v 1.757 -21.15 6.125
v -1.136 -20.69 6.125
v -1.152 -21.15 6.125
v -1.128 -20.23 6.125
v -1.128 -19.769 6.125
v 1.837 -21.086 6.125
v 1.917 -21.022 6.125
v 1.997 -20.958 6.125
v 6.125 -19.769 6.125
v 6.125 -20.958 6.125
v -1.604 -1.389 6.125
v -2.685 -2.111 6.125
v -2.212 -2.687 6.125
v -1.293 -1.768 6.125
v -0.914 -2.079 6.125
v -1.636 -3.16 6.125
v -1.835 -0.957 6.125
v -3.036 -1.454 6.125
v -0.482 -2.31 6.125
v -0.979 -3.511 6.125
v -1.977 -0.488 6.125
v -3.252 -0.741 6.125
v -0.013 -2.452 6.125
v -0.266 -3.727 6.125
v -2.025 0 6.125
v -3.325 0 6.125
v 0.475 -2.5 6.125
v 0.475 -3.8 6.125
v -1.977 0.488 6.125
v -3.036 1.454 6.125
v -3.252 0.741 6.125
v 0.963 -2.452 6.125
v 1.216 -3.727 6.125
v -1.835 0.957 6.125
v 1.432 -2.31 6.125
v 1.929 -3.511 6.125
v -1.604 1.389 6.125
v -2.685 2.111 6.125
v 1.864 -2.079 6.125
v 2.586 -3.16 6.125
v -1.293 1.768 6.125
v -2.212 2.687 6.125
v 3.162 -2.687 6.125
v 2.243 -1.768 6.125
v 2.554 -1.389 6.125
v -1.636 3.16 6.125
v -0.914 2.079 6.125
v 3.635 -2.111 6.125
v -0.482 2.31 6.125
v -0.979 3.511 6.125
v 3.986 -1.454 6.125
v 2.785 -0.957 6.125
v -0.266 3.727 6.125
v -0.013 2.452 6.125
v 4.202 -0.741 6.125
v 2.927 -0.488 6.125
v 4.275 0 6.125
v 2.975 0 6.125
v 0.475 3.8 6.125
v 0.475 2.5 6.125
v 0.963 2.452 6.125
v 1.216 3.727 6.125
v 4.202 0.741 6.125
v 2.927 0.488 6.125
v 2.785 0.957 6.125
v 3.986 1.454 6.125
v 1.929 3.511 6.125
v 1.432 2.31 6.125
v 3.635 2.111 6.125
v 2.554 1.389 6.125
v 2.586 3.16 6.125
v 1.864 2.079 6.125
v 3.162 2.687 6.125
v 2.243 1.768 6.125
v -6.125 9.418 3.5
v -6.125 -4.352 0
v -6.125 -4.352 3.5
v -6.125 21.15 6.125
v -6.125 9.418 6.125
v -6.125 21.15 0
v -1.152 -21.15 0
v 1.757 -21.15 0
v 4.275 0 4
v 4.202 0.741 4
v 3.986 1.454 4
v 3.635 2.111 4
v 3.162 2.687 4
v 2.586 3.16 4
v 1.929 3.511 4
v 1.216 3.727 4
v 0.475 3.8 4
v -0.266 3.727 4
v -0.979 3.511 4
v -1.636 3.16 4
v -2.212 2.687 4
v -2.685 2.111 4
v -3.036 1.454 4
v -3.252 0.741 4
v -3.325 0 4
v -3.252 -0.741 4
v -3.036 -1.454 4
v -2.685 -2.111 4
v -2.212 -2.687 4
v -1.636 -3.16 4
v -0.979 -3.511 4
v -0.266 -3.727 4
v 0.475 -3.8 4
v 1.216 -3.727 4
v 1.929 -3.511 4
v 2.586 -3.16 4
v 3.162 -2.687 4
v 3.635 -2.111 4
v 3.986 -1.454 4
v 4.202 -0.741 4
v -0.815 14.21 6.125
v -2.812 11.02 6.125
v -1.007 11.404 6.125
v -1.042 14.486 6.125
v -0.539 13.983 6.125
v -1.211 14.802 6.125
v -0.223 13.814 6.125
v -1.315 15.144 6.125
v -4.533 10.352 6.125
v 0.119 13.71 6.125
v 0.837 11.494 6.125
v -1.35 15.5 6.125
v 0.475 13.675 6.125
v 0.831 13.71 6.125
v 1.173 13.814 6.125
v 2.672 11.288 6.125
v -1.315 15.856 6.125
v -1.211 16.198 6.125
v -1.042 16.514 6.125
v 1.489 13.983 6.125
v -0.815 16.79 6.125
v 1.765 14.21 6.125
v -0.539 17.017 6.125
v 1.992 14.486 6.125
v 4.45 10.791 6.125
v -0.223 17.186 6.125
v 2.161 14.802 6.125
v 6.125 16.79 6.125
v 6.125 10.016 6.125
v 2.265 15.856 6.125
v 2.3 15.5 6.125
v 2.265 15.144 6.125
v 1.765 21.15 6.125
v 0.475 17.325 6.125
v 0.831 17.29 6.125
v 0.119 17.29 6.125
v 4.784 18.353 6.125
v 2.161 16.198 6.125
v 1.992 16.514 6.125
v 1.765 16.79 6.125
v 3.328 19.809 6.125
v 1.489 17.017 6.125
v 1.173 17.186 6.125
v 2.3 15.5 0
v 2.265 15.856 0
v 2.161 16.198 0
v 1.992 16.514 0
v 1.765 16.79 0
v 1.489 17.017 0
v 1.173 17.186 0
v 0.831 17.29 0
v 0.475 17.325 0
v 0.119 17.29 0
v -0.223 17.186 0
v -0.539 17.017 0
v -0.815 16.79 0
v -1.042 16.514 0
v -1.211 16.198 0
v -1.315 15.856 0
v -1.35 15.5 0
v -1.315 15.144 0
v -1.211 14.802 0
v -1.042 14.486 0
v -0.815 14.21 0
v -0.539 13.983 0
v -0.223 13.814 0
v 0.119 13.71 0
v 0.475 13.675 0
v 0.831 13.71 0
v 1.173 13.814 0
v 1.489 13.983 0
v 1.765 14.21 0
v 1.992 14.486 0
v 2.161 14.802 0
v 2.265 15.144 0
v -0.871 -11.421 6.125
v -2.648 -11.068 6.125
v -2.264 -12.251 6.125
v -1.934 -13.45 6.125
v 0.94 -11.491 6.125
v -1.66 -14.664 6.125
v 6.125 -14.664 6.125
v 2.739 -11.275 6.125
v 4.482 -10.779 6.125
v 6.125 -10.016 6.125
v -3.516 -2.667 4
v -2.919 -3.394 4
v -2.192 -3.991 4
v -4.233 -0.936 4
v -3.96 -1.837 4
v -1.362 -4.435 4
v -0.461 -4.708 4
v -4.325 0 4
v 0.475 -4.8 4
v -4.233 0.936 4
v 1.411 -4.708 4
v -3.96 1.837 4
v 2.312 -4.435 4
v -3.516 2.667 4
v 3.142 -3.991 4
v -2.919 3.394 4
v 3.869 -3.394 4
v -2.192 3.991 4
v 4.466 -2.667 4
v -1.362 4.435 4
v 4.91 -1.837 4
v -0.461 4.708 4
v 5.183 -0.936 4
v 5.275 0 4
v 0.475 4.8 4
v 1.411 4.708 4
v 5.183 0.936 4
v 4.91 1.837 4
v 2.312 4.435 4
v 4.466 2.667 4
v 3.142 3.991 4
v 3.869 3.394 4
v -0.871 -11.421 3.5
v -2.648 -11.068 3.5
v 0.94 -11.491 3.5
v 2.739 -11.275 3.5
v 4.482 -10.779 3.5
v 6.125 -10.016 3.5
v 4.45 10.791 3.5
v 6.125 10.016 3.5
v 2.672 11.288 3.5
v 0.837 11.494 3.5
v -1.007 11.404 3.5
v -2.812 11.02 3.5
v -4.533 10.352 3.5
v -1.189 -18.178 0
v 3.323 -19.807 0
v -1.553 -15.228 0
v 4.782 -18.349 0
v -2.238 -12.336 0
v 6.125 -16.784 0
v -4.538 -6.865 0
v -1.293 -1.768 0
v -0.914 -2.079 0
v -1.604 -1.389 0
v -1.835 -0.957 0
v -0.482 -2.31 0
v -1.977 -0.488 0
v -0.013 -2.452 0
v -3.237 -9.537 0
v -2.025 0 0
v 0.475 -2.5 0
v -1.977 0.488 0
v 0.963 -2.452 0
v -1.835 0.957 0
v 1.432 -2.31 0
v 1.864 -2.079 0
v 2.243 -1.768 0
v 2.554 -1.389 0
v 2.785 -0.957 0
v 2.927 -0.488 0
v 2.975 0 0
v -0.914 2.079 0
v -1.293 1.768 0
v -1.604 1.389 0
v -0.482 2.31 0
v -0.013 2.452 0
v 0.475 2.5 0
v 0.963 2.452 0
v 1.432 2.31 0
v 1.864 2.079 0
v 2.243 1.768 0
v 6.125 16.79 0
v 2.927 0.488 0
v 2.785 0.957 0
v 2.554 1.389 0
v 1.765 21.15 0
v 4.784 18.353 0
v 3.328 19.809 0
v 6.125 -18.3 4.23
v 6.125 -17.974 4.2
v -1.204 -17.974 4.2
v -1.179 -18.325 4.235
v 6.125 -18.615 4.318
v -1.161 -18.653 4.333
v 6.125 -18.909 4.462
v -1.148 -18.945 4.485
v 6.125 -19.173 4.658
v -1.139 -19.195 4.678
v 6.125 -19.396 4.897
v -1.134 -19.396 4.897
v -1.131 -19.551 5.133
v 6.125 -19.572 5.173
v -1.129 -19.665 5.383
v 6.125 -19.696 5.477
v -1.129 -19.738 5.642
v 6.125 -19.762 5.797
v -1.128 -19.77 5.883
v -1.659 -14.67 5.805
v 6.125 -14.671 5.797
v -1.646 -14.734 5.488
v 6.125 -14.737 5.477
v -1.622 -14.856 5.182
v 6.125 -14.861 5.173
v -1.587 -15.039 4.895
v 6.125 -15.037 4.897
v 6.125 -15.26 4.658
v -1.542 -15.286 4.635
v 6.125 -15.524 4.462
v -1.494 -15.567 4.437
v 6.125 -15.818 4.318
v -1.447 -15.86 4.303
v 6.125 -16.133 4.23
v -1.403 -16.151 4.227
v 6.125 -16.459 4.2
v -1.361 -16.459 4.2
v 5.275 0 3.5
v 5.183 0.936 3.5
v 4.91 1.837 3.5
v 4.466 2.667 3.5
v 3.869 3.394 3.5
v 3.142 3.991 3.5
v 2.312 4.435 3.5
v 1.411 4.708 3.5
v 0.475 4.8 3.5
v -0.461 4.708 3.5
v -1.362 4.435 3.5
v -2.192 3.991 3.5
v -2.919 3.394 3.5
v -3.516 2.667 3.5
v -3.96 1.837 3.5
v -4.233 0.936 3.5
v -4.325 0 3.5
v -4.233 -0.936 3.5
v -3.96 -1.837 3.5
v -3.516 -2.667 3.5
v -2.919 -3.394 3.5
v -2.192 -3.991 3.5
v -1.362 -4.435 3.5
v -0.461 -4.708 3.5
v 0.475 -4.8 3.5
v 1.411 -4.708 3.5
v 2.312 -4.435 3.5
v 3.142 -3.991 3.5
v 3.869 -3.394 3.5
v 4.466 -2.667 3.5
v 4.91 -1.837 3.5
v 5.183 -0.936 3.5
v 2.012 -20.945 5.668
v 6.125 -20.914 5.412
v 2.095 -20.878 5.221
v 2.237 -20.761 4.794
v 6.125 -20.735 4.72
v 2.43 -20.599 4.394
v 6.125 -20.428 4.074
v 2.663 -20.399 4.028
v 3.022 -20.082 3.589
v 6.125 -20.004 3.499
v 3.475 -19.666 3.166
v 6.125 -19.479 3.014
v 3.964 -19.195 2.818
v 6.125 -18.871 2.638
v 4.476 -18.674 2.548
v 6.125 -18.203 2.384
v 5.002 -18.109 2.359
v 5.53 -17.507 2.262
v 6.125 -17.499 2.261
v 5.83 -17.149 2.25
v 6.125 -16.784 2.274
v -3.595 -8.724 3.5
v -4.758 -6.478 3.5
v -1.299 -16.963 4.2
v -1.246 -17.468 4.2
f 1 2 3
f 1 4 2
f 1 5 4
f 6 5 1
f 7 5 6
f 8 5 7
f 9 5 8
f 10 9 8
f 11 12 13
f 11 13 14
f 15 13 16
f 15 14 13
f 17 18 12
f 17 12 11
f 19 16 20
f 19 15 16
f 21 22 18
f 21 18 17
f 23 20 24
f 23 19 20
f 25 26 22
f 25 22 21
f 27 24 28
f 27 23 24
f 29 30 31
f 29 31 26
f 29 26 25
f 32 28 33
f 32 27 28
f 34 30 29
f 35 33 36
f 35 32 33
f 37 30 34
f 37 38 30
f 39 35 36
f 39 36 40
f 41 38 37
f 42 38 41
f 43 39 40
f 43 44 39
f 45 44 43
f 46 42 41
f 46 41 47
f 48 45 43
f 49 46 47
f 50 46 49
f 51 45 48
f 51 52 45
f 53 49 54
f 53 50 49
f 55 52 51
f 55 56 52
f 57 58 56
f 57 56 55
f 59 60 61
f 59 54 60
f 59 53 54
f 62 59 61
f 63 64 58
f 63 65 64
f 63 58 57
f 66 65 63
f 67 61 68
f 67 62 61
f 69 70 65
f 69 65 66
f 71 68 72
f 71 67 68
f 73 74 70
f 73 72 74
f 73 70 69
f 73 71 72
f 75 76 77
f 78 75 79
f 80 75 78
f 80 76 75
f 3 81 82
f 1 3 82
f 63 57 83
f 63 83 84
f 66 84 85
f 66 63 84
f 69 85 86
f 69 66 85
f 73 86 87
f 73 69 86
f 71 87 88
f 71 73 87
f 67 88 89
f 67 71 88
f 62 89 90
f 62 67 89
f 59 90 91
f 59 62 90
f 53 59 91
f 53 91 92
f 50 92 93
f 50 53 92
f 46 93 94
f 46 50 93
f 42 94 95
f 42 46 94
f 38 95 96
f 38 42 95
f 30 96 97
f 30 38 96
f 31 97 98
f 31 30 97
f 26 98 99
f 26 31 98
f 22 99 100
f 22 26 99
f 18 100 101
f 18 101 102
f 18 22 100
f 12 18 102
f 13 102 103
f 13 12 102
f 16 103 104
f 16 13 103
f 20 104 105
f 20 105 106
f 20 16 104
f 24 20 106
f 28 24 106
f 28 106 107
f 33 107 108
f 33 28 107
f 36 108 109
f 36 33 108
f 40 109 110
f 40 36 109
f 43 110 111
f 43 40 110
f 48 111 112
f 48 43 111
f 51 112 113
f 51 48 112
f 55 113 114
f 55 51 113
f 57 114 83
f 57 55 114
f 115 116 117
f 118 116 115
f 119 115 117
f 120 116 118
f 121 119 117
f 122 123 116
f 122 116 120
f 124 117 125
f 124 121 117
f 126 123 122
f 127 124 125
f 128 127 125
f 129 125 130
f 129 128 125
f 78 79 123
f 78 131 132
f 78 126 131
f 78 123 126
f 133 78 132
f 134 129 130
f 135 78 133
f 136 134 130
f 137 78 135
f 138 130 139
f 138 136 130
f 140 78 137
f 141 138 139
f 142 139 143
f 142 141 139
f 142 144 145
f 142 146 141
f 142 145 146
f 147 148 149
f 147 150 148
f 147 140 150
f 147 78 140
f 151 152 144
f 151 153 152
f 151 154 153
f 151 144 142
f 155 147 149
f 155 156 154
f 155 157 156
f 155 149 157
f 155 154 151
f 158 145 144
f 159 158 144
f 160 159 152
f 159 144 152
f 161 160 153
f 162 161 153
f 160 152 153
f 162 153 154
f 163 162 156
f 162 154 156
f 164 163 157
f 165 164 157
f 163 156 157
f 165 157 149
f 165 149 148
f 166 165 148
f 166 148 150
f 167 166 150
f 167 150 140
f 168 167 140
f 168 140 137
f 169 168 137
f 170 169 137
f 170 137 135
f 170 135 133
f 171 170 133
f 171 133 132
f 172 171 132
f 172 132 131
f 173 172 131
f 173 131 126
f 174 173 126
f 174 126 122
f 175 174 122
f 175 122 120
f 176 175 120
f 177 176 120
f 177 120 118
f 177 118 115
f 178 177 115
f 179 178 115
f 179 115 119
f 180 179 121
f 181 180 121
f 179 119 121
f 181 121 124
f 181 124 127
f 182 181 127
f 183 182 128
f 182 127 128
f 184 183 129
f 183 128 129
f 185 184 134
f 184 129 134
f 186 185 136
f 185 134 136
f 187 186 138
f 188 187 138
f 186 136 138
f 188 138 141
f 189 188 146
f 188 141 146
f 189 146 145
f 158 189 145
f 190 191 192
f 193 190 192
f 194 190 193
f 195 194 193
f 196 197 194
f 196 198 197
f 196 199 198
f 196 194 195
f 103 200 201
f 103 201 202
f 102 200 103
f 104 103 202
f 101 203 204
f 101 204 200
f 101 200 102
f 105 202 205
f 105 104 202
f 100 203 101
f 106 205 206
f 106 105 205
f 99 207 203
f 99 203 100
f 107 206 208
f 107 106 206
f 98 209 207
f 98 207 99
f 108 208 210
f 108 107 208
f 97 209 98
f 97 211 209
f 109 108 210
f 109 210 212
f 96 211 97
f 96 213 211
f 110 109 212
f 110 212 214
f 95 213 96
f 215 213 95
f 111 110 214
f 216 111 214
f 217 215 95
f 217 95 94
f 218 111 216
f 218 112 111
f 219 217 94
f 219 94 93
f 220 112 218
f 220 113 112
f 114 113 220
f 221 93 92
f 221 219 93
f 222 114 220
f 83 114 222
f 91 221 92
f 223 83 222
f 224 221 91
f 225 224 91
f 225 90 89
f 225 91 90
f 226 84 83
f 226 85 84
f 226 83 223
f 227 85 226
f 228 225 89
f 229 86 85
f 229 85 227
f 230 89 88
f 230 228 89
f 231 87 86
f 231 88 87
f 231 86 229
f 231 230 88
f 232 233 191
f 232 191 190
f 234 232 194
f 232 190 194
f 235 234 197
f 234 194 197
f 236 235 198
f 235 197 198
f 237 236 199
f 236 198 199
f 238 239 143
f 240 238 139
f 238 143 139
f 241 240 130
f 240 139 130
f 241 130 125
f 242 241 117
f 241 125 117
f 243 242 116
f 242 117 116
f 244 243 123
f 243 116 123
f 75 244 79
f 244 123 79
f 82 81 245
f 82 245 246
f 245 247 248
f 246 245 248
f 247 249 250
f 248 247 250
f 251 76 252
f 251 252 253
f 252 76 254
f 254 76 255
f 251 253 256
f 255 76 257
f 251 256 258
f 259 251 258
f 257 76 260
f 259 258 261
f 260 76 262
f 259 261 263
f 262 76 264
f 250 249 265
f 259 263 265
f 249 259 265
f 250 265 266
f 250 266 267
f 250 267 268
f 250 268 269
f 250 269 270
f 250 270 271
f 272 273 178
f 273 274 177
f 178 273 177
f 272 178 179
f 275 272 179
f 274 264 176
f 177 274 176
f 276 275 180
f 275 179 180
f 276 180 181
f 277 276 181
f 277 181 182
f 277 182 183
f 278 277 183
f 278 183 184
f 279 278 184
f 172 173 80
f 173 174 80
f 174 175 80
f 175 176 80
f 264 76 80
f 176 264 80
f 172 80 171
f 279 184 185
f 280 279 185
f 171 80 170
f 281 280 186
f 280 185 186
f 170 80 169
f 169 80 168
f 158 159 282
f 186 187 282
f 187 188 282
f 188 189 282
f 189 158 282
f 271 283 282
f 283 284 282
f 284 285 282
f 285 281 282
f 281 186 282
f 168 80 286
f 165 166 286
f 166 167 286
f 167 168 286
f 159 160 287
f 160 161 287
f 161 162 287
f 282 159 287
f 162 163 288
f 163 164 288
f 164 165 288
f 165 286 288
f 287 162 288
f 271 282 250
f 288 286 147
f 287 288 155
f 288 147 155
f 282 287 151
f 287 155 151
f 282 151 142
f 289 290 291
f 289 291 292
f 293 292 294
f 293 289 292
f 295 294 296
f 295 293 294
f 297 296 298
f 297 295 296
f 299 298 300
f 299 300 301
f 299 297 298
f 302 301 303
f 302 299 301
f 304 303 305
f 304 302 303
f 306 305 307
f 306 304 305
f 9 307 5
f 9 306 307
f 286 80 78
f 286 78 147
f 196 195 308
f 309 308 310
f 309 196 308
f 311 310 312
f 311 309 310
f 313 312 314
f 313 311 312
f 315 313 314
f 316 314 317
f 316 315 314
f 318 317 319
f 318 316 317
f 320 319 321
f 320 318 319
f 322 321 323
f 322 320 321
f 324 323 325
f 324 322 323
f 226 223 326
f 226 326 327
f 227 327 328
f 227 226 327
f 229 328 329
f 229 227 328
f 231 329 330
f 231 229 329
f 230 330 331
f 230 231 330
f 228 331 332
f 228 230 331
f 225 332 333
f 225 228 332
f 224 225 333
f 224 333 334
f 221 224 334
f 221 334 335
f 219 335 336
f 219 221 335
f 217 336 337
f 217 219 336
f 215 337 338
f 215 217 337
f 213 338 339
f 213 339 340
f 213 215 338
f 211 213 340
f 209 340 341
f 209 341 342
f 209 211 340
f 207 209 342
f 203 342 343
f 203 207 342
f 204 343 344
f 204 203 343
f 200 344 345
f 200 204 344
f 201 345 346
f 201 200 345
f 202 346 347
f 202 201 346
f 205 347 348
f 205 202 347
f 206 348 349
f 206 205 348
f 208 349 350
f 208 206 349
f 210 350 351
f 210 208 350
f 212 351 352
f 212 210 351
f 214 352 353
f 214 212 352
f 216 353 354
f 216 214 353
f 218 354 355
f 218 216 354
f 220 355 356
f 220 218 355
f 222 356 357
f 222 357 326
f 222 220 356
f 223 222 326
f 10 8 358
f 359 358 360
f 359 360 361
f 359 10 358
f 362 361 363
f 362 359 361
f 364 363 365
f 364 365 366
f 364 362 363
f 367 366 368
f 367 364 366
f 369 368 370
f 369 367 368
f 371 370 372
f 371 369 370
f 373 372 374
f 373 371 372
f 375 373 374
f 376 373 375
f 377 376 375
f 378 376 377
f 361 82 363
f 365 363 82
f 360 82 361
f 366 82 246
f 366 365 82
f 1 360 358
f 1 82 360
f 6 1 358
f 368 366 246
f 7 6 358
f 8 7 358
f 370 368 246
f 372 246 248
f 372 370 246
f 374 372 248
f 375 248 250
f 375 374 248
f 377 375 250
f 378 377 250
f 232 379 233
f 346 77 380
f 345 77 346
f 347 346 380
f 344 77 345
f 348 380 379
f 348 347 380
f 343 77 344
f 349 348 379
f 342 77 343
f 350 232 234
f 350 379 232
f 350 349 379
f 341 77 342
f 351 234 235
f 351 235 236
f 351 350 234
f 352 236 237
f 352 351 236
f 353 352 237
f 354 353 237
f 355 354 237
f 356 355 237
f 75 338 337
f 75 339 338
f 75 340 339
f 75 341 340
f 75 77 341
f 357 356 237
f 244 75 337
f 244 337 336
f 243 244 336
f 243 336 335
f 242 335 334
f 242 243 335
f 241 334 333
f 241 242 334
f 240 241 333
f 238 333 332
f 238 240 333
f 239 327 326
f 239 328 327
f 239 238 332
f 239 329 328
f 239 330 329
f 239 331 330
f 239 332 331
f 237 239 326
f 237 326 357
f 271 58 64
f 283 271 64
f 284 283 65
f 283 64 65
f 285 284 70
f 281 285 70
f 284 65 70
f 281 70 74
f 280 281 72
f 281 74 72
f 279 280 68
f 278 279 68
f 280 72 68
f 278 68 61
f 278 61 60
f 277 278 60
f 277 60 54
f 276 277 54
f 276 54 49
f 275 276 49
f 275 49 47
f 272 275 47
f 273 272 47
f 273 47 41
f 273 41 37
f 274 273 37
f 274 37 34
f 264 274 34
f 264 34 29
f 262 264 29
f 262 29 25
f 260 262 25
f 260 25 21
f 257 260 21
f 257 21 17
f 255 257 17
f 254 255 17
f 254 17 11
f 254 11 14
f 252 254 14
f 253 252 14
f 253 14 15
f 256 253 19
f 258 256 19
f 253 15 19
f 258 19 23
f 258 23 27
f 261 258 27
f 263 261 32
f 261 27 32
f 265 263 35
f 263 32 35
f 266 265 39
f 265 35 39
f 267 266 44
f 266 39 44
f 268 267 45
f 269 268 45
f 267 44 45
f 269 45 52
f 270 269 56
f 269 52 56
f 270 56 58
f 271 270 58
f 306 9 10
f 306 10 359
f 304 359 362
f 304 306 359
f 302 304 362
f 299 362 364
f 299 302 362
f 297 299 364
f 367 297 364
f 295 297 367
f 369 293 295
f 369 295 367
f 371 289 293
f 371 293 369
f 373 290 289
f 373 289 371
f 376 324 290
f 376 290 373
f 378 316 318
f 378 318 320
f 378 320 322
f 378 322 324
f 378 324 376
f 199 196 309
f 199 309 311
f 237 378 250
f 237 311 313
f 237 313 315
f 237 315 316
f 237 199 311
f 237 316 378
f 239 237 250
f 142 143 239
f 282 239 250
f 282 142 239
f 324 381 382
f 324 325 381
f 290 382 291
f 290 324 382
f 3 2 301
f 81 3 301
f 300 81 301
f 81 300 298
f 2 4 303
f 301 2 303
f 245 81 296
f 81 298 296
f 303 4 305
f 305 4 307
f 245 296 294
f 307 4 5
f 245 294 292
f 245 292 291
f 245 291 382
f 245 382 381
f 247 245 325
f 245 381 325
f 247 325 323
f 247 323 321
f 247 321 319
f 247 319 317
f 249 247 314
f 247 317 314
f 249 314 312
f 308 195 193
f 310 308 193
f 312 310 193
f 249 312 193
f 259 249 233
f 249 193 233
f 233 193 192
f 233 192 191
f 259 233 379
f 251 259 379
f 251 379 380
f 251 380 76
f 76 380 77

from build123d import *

# Parameters (mm, degrees)
SKETCH1_W           = 12.25
SKETCH1_H           = 42.3
BOSS_EXTRUDE1_DEPTH = 6.125
SKETCH2_R           = 1.825
SKETCH2_R_2         = 2.5
CUT_EXTRUDE1_DEPTH  = 23.855059615
CUT_EXTRUDE2_DEPTH  = 23.855059615
SKETCH4_R           = 11.5
CUT_EXTRUDE3_DEPTH  = 2.625
BOSS_EXTRUDE2_START = 0.5
SKETCH5_R           = 4.8
SKETCH5_R_2         = 2.5
BOSS_EXTRUDE2_DEPTH = 0.5
BOSS_EXTRUDE3_START = 2.125
SKETCH6_R           = 3.8
SKETCH6_R_2         = 2.5
BOSS_EXTRUDE3_DEPTH = 2.125
BOSS_EXTRUDE4_REACH = 27.197
CUT_EXTRUDE4_DEPTH  = 26.19723458


with BuildPart() as part:
    # Sketch1 → Boss-Extrude1 (new body)
    with BuildSketch(Plane.XY):
        Rectangle(SKETCH1_W, SKETCH1_H)
    extrude(amount=BOSS_EXTRUDE1_DEPTH)

    # Sketch2 → Cut-Extrude1 (cut, through all)
    with BuildSketch(Plane.XY.offset(6.125)):
        with Locations((0.475, 15.5)):
            Circle(SKETCH2_R)
        with Locations((0.475, 0)):
            Circle(SKETCH2_R_2)
    extrude(amount=-CUT_EXTRUDE1_DEPTH, mode=Mode.SUBTRACT)

    # Sketch3 → Cut-Extrude2 (cut, through all)
    with BuildSketch(Plane.XY.offset(6.125)):
        with BuildLine():
            Line((-6.125, -21.15), (-1.151863079, -21.15))
            ThreePointArc((-1.151863079, -21.15), (-2.238128282, -12.336341525), (-6.125, -4.351807973))
            Line((-6.125, -4.351807973), (-6.125, -21.15))
        make_face()
        with BuildLine():
            Line((6.125, 21.15), (1.764842259, 21.15))
            ThreePointArc((1.764842259, 21.15), (4.069800152, 19.094796032), (6.125, 16.789834467))
            Line((6.125, 16.789834467), (6.125, 21.15))
        make_face()
        with BuildLine():
            Line((6.125, -21.15), (1.757457575, -21.15))
            ThreePointArc((1.757457575, -21.15), (4.066466825, -19.092268783), (6.125, -16.783974467))
            Line((6.125, -16.783974467), (6.125, -21.15))
        make_face()
    extrude(amount=-CUT_EXTRUDE2_DEPTH, mode=Mode.SUBTRACT)

    # Sketch4 → Cut-Extrude3 (cut)
    with BuildSketch(Plane.XY.offset(6.125)):
        with Locations((0.475, 0)):
            Circle(SKETCH4_R)
    extrude(amount=-CUT_EXTRUDE3_DEPTH, mode=Mode.SUBTRACT)

    # Sketch5 → Boss-Extrude2 (add)
    with BuildSketch(Plane.XY.offset(3.5).offset(BOSS_EXTRUDE2_START)):
        with Locations((0.475, 0)):
            Circle(SKETCH5_R)
        with Locations((0.475, 0)):
            Circle(SKETCH5_R_2, mode=Mode.SUBTRACT)
    extrude(amount=-BOSS_EXTRUDE2_DEPTH)

    # Sketch6 → Boss-Extrude3 (add)
    with BuildSketch(Plane.XY.offset(4).offset(BOSS_EXTRUDE3_START)):
        with Locations((0.475, 0)):
            Circle(SKETCH6_R)
        with Locations((0.475, 0)):
            Circle(SKETCH6_R_2, mode=Mode.SUBTRACT)
    extrude(amount=-BOSS_EXTRUDE3_DEPTH)

    # Sketch7 → Boss-Extrude4 (add, up to next)
    with BuildSketch(Plane(origin=(6.125, 0, 0), x_dir=(0, 0, -1), z_dir=(1, 0, 0)), mode=Mode.PRIVATE) as boss_extrude4_sk1:
        with BuildLine():
            Line((-6.125, -13.462065527), (-6.125, -20.957897703))
            ThreePointArc((-6.125, -20.957897703), (-2.25, -17.209981615), (-6.125, -13.462065527))
        make_face()
    boss_extrude4_tool1 = extrude(boss_extrude4_sk1.sketch, amount=-BOSS_EXTRUDE4_REACH, mode=Mode.PRIVATE) - part.part
    add(boss_extrude4_tool1.solids().sort_by_distance((6.125, -17.209982, 4.47578))[0])

    # Sketch8 → Cut-Extrude4 (cut, through all)
    with BuildSketch(Plane(origin=(6.125, 0, 0), x_dir=(0, 0, -1), z_dir=(1, 0, 0))):
        with BuildLine():
            Line((-7.8, -17.973571615), (-7.8, -16.459481615))
            ThreePointArc((-7.8, -16.459481615), (-6, -14.659481615), (-4.2, -16.459481615))
            Line((-4.2, -16.459481615), (-4.2, -17.973571615))
            ThreePointArc((-4.2, -17.973571615), (-6, -19.773571615), (-7.8, -17.973571615))
        make_face()
    extrude(amount=-CUT_EXTRUDE4_DEPTH, mode=Mode.SUBTRACT)


solid = part.part
